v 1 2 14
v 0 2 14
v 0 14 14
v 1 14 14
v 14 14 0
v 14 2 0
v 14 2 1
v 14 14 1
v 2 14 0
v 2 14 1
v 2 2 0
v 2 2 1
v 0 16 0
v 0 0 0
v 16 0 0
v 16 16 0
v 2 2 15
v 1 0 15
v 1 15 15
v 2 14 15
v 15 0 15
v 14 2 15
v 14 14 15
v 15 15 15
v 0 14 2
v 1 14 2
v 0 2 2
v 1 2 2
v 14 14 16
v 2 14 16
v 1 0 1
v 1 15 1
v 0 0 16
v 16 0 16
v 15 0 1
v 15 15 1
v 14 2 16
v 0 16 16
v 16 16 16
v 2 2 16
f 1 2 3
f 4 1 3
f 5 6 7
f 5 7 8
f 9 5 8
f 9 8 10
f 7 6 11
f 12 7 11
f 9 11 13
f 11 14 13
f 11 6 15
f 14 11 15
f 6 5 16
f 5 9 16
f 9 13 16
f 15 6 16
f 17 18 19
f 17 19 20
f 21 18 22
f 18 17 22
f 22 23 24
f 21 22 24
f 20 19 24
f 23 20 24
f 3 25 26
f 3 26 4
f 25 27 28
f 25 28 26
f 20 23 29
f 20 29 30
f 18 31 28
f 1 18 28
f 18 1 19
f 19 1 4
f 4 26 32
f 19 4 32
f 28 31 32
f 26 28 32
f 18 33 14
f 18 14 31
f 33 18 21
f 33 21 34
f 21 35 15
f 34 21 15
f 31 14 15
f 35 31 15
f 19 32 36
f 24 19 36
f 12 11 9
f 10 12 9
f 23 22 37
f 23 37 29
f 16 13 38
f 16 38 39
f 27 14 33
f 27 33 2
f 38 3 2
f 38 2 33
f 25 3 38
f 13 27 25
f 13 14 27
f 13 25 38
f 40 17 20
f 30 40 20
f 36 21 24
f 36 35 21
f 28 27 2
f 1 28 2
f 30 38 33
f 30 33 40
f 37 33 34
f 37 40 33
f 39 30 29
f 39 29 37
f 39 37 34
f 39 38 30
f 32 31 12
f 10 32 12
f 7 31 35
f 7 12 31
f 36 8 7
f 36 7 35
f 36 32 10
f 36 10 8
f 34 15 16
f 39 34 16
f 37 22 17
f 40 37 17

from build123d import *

# Parameters (mm, degrees)
SKETCH1_W           = 16
SKETCH1_H           = 16
BOSS_EXTRUDE1_DEPTH = 16
SHELL1_T            = -1
SKETCH2_W           = 12
SKETCH2_H           = 12
CUT_EXTRUDE1_DEPTH  = 17
SKETCH3_W           = 12
SKETCH3_H           = 12
CUT_EXTRUDE3_DEPTH  = 7


with BuildPart() as part:
    # Sketch1 → Boss-Extrude1 (new body)
    with BuildSketch(Plane.XY):
        with Locations((8, 8)):
            Rectangle(SKETCH1_W, SKETCH1_H)
    extrude(amount=BOSS_EXTRUDE1_DEPTH)

    # Shell1
    shell1_openings = [part.faces().sort_by_distance(p)[0] for p in [
        (8, 0, 8),
    ]]
    offset(amount=SHELL1_T, openings=shell1_openings, kind=Kind.INTERSECTION)

    # Sketch2 → Cut-Extrude1 (cut, through all)
    with BuildSketch(Plane(origin=(0, 0, 0), x_dir=(-1, 0, 0), z_dir=(0, 0, -1))):
        with Locations((-8, 8)):
            Rectangle(SKETCH2_W, SKETCH2_H)
    extrude(amount=-CUT_EXTRUDE1_DEPTH, mode=Mode.SUBTRACT)

    # Sketch3 → Cut-Extrude3 (cut)
    with BuildSketch(Plane.ZY):
        with Locations((8, 8)):
            Rectangle(SKETCH3_W, SKETCH3_H)
    extrude(amount=-CUT_EXTRUDE3_DEPTH, mode=Mode.SUBTRACT)


solid = part.part
